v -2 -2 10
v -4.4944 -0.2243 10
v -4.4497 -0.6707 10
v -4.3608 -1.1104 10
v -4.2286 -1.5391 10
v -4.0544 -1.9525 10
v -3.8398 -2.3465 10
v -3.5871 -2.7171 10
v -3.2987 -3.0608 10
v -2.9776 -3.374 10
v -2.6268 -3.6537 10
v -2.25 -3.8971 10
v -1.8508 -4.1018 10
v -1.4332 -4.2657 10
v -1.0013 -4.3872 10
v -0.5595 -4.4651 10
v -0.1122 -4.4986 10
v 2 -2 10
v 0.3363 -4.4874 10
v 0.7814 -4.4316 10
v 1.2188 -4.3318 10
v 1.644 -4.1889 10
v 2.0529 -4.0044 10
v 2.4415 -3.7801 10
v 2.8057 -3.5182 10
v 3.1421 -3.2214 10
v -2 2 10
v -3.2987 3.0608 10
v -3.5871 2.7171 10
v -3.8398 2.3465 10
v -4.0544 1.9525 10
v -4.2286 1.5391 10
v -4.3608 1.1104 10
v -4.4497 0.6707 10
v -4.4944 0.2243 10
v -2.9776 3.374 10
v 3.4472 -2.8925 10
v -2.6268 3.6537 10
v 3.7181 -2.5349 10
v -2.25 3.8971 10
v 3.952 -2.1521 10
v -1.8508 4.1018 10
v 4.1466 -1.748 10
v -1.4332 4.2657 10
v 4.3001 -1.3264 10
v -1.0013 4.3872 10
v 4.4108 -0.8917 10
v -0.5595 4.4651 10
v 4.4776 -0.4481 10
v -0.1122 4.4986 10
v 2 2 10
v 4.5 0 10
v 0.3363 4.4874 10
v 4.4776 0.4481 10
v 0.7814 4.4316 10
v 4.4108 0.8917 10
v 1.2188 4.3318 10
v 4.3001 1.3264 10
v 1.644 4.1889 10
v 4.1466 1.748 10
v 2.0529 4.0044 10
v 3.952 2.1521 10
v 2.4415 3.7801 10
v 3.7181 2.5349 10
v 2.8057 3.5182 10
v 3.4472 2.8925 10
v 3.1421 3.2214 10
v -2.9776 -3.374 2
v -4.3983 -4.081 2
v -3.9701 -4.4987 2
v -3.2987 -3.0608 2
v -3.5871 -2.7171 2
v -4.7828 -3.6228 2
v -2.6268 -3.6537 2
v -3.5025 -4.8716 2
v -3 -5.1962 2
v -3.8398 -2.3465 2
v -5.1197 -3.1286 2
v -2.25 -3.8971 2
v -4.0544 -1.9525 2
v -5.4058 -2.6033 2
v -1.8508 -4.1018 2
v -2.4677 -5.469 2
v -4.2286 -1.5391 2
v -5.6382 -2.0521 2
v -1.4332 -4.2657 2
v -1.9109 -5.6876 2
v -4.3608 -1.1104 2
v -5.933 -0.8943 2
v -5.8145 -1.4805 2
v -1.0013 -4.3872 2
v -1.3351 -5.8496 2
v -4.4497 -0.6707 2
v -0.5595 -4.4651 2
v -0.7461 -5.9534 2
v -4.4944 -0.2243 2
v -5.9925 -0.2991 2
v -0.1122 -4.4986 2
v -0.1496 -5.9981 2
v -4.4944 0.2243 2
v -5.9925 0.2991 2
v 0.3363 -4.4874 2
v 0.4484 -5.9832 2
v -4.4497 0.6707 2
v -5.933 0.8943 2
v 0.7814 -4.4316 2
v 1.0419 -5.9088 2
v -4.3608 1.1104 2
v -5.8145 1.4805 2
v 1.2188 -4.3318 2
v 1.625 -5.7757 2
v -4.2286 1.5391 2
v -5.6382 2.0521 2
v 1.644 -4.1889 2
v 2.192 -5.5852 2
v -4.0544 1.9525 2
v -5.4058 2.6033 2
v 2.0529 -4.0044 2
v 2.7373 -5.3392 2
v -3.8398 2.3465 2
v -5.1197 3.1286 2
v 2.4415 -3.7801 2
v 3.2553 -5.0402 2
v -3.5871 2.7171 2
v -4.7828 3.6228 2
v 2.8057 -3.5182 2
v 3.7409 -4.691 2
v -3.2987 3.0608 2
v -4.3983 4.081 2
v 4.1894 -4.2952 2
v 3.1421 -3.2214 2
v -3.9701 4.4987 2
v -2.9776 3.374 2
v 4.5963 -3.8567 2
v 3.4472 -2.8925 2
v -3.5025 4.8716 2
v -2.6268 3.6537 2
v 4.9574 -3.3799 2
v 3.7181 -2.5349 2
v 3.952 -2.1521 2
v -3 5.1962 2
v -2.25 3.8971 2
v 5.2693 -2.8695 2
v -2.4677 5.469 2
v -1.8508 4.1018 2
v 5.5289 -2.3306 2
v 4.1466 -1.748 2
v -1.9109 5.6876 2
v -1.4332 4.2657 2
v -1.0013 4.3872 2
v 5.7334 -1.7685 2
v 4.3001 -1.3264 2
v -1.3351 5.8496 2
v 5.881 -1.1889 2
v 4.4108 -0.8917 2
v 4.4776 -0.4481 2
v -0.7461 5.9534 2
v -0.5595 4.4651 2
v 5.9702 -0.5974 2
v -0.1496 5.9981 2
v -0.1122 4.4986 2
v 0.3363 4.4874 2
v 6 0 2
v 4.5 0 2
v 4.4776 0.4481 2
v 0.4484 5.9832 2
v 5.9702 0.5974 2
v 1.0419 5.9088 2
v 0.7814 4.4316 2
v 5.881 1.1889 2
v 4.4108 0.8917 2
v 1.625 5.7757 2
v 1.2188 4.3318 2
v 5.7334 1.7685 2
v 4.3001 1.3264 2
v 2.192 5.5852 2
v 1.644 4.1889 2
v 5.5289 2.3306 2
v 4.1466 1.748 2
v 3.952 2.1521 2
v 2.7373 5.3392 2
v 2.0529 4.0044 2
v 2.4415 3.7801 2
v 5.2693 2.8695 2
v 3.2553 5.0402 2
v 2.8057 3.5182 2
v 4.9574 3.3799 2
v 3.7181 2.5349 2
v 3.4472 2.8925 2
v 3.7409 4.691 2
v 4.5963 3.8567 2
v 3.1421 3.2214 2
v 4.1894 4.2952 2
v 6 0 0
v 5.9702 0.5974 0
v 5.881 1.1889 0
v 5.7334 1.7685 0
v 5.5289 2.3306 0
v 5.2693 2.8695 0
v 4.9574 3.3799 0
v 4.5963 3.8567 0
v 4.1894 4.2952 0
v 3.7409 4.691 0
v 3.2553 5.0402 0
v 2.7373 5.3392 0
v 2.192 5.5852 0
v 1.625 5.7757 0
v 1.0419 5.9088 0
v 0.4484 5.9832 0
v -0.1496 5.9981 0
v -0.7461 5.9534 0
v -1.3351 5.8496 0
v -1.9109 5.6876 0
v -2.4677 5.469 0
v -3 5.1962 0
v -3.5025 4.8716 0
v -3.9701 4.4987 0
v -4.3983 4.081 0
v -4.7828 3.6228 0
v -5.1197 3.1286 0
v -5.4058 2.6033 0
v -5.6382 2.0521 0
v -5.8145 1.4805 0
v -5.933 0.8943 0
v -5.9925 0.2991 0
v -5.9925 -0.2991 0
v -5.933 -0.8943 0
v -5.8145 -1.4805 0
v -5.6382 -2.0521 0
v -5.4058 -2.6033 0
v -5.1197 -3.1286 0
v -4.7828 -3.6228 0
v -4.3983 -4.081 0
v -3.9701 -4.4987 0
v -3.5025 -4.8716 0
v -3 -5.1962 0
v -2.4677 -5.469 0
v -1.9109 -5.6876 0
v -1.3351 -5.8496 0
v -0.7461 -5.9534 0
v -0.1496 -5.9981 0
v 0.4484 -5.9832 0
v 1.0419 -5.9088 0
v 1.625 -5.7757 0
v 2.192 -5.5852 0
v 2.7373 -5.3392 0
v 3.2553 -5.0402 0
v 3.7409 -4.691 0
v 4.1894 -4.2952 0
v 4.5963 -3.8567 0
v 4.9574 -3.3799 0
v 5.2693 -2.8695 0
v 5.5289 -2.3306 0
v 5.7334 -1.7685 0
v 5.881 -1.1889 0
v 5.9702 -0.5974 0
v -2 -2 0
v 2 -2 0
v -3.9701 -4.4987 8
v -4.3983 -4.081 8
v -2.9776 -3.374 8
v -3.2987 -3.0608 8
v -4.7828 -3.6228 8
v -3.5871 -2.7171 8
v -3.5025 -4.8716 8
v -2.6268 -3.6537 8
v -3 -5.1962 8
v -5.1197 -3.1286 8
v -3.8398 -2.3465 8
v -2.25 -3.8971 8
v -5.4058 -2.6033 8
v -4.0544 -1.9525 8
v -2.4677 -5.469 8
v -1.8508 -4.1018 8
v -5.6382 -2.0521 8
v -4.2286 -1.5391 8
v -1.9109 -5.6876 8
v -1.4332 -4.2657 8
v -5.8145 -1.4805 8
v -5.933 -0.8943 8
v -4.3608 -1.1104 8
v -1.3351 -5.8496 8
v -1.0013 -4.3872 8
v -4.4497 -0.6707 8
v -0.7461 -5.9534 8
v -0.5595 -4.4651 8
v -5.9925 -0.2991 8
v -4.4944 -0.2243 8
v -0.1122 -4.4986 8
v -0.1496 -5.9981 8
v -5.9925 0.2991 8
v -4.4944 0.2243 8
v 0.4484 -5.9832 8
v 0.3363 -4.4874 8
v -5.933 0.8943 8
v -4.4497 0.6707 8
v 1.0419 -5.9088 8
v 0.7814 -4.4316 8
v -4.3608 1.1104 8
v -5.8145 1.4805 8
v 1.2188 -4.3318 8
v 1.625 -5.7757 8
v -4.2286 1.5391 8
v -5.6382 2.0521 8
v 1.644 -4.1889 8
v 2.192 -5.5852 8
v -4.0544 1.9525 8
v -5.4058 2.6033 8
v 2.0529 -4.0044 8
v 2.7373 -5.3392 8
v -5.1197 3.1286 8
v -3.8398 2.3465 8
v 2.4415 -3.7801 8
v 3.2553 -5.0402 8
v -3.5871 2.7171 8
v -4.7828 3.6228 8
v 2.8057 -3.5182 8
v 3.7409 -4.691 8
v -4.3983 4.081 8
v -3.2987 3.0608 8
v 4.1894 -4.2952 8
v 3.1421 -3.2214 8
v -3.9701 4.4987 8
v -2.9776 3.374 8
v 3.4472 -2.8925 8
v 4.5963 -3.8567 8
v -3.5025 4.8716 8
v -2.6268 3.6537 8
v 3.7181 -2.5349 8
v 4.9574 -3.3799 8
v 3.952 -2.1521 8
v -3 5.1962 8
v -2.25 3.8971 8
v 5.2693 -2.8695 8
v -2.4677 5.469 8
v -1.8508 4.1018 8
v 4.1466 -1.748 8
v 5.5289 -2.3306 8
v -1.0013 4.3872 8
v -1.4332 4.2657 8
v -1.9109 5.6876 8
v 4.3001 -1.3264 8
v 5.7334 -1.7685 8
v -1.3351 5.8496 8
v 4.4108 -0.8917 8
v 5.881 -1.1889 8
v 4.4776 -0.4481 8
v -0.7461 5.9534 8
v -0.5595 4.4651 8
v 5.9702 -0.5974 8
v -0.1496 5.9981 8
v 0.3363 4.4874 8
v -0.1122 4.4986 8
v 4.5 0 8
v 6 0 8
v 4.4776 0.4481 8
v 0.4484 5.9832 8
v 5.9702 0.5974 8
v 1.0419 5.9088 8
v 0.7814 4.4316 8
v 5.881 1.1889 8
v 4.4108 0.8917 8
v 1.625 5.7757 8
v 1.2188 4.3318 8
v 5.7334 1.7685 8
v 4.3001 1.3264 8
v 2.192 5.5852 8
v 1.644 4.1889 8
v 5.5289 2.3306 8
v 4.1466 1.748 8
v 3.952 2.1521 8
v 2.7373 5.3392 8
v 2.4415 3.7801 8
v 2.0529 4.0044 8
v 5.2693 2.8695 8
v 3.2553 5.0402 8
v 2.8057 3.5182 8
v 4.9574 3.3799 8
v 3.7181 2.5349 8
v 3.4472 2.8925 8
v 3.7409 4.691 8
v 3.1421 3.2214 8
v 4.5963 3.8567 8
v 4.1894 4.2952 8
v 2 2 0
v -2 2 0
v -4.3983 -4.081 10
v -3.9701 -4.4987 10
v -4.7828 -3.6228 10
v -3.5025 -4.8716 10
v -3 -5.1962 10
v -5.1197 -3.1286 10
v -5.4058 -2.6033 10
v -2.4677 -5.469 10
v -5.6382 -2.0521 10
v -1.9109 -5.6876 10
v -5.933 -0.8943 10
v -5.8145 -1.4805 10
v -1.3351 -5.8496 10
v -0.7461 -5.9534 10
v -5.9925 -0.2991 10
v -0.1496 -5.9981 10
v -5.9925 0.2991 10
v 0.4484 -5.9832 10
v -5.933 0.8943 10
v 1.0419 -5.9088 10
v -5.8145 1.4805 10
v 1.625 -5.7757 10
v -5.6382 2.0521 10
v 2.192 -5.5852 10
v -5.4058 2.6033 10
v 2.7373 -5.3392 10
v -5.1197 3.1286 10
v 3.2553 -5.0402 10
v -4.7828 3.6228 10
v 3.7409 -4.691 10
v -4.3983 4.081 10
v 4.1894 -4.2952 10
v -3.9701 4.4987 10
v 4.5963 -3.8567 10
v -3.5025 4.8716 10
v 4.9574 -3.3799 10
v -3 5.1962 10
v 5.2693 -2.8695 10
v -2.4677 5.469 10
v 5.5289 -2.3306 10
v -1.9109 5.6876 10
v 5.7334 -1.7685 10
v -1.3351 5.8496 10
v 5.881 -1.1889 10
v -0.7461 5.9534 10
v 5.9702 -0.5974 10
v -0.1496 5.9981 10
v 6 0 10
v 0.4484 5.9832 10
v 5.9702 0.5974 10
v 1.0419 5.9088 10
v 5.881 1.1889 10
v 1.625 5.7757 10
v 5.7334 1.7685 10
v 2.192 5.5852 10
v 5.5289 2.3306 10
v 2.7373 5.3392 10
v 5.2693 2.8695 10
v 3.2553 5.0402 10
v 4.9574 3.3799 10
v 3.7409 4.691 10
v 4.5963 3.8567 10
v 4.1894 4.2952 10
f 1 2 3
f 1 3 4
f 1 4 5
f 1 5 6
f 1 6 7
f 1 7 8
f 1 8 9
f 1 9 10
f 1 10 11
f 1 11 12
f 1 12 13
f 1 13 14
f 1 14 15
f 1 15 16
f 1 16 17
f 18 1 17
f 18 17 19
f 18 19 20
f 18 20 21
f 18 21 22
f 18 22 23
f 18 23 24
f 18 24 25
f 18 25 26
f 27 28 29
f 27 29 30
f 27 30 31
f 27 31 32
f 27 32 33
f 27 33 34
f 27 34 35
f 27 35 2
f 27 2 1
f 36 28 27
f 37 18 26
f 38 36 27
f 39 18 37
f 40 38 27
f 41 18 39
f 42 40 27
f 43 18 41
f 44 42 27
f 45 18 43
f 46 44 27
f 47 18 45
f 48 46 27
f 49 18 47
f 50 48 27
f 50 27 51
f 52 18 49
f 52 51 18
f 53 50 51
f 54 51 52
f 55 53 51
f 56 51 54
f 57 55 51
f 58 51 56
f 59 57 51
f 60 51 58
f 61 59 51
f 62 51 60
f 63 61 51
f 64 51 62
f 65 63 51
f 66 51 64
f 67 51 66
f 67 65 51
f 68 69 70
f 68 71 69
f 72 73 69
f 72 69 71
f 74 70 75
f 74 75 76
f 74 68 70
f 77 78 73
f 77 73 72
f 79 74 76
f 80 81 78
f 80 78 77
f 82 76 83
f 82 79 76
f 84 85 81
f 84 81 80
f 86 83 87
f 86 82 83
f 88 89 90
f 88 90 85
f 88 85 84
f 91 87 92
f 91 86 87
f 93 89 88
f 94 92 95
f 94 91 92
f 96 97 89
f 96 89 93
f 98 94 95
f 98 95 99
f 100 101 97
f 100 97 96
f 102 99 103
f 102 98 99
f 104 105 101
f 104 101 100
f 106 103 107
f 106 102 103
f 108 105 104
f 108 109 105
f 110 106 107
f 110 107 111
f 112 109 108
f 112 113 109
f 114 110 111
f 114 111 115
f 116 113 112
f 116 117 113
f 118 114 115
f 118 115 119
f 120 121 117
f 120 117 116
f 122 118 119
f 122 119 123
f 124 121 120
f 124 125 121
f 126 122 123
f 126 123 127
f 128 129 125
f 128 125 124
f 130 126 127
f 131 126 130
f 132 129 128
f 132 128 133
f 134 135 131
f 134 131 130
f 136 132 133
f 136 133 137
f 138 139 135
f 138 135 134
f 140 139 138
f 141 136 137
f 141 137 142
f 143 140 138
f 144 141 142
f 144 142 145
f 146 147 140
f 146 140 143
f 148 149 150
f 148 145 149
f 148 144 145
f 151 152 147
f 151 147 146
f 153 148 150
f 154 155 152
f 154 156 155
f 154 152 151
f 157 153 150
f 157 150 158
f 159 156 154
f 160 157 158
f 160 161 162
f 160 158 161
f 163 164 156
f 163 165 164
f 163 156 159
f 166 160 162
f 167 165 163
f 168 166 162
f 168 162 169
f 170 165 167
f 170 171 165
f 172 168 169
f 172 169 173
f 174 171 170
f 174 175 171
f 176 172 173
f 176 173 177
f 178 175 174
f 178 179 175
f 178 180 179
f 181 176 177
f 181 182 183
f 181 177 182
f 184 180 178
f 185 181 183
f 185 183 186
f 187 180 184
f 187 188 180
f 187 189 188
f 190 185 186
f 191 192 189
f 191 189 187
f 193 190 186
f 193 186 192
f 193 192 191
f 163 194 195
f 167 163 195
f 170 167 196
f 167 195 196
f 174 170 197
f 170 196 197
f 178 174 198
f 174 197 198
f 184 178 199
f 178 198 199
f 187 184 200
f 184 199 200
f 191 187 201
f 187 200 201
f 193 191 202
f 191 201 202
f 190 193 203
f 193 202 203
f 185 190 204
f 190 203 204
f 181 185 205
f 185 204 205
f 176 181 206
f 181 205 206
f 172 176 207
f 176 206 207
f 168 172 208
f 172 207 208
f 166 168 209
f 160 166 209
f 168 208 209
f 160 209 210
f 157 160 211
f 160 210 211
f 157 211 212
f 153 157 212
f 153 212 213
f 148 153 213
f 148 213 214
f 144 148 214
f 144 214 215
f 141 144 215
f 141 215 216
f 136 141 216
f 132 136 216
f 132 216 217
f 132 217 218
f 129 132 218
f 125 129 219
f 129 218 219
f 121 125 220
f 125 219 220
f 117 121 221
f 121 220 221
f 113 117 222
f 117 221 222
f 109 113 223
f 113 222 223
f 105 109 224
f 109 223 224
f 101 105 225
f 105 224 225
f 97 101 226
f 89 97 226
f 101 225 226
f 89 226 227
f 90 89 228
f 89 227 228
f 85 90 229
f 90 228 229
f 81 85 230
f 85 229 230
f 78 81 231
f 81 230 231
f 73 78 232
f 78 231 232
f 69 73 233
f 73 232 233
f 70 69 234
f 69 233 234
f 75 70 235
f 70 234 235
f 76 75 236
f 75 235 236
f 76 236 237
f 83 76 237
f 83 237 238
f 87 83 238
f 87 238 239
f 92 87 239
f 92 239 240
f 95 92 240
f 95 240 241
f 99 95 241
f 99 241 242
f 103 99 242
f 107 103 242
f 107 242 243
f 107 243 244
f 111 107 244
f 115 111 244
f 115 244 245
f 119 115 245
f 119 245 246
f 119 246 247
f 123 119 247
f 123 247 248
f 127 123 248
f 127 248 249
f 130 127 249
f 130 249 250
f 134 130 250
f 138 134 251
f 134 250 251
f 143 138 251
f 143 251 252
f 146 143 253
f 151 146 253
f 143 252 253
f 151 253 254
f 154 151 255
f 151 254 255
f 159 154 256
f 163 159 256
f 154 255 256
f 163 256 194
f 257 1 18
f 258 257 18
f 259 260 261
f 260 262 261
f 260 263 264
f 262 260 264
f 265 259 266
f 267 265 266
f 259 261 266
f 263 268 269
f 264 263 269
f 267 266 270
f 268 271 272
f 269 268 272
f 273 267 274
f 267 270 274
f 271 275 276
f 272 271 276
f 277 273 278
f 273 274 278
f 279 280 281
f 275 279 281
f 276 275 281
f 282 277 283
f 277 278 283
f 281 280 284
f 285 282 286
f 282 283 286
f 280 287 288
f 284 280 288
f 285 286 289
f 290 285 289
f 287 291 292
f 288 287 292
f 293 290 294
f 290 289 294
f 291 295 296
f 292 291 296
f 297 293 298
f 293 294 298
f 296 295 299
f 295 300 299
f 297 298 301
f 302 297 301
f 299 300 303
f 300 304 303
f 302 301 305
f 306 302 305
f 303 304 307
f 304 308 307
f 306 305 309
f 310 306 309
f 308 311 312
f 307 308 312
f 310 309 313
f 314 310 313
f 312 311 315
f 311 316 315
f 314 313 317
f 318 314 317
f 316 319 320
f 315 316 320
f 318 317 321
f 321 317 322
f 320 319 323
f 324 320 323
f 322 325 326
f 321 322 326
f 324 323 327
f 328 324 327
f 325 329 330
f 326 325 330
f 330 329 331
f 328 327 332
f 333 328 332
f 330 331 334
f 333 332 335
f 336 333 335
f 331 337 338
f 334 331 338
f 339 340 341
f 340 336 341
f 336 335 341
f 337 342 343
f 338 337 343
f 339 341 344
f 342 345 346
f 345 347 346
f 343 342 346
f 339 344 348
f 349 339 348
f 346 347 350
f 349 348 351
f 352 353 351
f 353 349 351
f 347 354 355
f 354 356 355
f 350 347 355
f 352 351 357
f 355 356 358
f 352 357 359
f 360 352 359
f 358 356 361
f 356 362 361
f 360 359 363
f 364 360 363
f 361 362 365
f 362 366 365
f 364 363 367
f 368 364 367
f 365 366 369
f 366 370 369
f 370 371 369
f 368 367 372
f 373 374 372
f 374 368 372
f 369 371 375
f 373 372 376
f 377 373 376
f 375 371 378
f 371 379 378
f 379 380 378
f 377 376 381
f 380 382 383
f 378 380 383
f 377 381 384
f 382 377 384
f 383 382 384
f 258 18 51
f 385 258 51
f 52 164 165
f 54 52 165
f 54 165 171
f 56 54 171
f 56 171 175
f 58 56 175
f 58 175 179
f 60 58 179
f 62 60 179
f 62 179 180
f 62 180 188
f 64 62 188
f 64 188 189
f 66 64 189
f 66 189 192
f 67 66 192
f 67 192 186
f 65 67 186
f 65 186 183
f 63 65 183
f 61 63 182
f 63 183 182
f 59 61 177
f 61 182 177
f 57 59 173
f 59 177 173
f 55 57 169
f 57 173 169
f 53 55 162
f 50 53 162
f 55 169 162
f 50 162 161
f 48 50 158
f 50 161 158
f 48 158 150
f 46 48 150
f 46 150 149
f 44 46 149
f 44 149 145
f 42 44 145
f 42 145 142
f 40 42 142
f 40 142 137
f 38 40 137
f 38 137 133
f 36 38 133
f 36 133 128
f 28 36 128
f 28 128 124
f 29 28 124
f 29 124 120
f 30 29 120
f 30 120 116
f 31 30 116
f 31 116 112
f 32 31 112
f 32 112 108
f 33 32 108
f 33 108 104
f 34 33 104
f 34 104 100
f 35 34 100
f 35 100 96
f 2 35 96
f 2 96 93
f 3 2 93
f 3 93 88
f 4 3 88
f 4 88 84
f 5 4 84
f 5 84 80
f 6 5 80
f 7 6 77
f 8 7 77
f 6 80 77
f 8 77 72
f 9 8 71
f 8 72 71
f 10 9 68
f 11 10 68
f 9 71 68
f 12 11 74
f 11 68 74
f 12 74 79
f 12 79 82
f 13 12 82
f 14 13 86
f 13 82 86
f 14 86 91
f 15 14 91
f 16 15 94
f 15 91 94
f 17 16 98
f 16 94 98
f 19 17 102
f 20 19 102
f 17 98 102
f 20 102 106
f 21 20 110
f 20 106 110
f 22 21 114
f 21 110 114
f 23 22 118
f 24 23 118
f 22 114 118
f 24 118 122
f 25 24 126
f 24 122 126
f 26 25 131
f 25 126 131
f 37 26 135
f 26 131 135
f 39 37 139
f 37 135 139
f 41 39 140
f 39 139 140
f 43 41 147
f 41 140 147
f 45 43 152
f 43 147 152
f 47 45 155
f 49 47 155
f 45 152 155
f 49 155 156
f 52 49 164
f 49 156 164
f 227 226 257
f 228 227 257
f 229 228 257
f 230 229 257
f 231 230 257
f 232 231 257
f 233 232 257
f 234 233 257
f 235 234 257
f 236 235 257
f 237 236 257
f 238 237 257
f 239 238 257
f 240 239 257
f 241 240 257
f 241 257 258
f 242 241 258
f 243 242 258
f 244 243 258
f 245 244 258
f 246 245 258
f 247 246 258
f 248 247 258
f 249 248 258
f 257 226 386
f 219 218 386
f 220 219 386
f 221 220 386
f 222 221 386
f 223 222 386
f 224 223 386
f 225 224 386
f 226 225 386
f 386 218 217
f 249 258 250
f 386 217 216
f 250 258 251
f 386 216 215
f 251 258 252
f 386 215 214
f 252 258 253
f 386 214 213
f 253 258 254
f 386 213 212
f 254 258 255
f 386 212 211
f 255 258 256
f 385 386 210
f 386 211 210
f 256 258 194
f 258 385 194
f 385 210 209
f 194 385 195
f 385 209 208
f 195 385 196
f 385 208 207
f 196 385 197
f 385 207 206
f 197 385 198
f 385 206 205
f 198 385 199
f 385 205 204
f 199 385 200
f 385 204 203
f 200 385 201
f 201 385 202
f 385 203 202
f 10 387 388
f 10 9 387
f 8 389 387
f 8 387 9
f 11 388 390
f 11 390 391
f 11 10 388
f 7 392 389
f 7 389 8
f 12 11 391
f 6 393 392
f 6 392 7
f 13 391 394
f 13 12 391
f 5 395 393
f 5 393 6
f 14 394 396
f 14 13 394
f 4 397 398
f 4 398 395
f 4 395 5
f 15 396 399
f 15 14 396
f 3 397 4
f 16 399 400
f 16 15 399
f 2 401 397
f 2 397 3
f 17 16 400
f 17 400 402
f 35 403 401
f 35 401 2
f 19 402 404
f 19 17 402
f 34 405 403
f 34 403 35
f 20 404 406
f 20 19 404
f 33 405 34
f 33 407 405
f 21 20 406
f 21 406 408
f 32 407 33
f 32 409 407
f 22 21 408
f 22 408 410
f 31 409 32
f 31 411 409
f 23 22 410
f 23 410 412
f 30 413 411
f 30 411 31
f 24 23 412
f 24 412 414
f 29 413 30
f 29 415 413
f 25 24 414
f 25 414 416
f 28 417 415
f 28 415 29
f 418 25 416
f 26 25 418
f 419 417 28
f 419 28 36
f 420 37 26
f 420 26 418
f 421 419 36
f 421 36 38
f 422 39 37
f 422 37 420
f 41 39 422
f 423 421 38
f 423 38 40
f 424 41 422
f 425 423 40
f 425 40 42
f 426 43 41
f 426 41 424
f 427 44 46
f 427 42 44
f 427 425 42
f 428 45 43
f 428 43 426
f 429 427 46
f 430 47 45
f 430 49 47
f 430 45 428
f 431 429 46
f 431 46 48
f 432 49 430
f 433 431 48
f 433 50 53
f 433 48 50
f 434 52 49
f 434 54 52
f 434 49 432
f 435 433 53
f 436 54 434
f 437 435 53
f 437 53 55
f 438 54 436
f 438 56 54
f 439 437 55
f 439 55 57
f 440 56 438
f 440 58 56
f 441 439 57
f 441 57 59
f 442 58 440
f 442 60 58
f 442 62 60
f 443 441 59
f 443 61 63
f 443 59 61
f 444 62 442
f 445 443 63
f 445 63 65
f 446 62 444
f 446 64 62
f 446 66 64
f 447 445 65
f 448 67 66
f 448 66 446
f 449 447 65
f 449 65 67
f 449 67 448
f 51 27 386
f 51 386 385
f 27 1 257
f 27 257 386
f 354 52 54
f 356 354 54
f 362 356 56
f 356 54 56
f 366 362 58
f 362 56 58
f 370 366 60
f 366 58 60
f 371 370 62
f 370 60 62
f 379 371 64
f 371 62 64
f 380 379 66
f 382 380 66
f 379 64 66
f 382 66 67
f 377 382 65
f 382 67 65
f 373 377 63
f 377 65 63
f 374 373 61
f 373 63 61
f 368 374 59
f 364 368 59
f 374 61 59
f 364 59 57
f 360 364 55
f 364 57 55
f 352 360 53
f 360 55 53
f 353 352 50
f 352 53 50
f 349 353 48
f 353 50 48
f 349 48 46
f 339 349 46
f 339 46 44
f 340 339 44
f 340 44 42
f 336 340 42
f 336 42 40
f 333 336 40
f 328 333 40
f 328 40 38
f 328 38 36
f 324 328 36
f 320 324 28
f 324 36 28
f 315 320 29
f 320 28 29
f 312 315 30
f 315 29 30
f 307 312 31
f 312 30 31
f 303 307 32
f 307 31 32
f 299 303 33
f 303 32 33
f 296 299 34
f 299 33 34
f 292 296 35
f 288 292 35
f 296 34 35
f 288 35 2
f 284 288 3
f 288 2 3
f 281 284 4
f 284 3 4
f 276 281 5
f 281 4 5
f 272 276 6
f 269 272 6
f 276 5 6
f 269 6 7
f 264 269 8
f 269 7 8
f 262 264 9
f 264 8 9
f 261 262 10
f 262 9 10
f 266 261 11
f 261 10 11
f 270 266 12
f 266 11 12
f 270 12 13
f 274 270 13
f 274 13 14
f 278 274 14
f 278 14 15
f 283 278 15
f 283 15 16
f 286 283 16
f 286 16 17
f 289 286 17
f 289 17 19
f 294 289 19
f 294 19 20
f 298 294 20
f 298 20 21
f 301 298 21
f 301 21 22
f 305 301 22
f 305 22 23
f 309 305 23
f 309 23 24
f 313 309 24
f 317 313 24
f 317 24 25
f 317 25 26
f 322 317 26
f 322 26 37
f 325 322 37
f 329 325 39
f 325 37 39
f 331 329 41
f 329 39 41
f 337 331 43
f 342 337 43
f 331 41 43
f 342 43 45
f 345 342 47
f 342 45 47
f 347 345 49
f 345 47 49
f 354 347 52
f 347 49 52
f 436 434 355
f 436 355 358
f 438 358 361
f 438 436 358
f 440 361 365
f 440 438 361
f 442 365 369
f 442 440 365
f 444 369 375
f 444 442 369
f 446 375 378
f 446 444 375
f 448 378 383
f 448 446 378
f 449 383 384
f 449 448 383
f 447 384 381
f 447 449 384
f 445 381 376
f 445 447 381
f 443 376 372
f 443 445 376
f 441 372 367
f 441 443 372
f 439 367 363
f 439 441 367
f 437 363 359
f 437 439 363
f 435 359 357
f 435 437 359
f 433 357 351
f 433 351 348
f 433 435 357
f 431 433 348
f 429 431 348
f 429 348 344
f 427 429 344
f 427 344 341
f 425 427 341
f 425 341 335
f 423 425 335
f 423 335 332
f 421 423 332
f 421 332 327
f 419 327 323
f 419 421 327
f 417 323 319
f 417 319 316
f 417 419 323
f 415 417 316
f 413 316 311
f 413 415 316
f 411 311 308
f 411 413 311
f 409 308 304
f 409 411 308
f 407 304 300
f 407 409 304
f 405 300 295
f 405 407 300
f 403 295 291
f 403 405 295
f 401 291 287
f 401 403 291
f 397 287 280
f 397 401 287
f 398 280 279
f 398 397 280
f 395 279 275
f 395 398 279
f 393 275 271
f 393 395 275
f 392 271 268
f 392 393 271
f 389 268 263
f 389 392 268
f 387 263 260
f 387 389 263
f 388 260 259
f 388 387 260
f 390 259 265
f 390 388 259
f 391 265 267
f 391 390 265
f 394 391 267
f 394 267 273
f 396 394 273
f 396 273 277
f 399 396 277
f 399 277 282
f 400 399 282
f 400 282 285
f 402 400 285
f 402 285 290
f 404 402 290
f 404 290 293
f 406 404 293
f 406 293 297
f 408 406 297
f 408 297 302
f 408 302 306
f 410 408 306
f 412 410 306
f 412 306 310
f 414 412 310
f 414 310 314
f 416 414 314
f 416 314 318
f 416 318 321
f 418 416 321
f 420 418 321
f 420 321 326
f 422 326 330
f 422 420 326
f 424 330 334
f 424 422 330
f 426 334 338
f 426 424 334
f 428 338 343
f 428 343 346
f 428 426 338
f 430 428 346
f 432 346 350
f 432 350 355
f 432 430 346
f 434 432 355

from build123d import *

# Parameters (mm, degrees)
F0_R     = 6
F0_R_2   = 4.5
F1_DEPTH = 2
F2_DEPTH = 10
F3_R     = 6
F3_R_2   = 4.5
F4_DEPTH = 2
F3_W     = 4
F3_H     = 4
F5_DEPTH = 25


with BuildPart() as f1:
    # F0 (on Top) → F1 (new body)
    with BuildSketch(Plane.XY):
        Circle(F0_R)
        Circle(F0_R_2, mode=Mode.SUBTRACT)
    extrude(amount=F1_DEPTH)

    # F0 (on Top) → F2 (join)
    with BuildSketch(Plane.XY):
        Circle(F0_R_2)
    extrude(amount=F2_DEPTH)

    # F3 (on face) → F5 (cut)
    with BuildSketch(Plane.XY.offset(10)):
        Rectangle(F3_W, F3_H)
    extrude(amount=-F5_DEPTH, mode=Mode.SUBTRACT)


with BuildPart() as f4:
    # F3 (on face) → F4 (new body)
    with BuildSketch(Plane.XY.offset(10)):
        Circle(F3_R)
        Circle(F3_R_2, mode=Mode.SUBTRACT)
    extrude(amount=-F4_DEPTH)


solid = Compound([f1.part, f4.part])
